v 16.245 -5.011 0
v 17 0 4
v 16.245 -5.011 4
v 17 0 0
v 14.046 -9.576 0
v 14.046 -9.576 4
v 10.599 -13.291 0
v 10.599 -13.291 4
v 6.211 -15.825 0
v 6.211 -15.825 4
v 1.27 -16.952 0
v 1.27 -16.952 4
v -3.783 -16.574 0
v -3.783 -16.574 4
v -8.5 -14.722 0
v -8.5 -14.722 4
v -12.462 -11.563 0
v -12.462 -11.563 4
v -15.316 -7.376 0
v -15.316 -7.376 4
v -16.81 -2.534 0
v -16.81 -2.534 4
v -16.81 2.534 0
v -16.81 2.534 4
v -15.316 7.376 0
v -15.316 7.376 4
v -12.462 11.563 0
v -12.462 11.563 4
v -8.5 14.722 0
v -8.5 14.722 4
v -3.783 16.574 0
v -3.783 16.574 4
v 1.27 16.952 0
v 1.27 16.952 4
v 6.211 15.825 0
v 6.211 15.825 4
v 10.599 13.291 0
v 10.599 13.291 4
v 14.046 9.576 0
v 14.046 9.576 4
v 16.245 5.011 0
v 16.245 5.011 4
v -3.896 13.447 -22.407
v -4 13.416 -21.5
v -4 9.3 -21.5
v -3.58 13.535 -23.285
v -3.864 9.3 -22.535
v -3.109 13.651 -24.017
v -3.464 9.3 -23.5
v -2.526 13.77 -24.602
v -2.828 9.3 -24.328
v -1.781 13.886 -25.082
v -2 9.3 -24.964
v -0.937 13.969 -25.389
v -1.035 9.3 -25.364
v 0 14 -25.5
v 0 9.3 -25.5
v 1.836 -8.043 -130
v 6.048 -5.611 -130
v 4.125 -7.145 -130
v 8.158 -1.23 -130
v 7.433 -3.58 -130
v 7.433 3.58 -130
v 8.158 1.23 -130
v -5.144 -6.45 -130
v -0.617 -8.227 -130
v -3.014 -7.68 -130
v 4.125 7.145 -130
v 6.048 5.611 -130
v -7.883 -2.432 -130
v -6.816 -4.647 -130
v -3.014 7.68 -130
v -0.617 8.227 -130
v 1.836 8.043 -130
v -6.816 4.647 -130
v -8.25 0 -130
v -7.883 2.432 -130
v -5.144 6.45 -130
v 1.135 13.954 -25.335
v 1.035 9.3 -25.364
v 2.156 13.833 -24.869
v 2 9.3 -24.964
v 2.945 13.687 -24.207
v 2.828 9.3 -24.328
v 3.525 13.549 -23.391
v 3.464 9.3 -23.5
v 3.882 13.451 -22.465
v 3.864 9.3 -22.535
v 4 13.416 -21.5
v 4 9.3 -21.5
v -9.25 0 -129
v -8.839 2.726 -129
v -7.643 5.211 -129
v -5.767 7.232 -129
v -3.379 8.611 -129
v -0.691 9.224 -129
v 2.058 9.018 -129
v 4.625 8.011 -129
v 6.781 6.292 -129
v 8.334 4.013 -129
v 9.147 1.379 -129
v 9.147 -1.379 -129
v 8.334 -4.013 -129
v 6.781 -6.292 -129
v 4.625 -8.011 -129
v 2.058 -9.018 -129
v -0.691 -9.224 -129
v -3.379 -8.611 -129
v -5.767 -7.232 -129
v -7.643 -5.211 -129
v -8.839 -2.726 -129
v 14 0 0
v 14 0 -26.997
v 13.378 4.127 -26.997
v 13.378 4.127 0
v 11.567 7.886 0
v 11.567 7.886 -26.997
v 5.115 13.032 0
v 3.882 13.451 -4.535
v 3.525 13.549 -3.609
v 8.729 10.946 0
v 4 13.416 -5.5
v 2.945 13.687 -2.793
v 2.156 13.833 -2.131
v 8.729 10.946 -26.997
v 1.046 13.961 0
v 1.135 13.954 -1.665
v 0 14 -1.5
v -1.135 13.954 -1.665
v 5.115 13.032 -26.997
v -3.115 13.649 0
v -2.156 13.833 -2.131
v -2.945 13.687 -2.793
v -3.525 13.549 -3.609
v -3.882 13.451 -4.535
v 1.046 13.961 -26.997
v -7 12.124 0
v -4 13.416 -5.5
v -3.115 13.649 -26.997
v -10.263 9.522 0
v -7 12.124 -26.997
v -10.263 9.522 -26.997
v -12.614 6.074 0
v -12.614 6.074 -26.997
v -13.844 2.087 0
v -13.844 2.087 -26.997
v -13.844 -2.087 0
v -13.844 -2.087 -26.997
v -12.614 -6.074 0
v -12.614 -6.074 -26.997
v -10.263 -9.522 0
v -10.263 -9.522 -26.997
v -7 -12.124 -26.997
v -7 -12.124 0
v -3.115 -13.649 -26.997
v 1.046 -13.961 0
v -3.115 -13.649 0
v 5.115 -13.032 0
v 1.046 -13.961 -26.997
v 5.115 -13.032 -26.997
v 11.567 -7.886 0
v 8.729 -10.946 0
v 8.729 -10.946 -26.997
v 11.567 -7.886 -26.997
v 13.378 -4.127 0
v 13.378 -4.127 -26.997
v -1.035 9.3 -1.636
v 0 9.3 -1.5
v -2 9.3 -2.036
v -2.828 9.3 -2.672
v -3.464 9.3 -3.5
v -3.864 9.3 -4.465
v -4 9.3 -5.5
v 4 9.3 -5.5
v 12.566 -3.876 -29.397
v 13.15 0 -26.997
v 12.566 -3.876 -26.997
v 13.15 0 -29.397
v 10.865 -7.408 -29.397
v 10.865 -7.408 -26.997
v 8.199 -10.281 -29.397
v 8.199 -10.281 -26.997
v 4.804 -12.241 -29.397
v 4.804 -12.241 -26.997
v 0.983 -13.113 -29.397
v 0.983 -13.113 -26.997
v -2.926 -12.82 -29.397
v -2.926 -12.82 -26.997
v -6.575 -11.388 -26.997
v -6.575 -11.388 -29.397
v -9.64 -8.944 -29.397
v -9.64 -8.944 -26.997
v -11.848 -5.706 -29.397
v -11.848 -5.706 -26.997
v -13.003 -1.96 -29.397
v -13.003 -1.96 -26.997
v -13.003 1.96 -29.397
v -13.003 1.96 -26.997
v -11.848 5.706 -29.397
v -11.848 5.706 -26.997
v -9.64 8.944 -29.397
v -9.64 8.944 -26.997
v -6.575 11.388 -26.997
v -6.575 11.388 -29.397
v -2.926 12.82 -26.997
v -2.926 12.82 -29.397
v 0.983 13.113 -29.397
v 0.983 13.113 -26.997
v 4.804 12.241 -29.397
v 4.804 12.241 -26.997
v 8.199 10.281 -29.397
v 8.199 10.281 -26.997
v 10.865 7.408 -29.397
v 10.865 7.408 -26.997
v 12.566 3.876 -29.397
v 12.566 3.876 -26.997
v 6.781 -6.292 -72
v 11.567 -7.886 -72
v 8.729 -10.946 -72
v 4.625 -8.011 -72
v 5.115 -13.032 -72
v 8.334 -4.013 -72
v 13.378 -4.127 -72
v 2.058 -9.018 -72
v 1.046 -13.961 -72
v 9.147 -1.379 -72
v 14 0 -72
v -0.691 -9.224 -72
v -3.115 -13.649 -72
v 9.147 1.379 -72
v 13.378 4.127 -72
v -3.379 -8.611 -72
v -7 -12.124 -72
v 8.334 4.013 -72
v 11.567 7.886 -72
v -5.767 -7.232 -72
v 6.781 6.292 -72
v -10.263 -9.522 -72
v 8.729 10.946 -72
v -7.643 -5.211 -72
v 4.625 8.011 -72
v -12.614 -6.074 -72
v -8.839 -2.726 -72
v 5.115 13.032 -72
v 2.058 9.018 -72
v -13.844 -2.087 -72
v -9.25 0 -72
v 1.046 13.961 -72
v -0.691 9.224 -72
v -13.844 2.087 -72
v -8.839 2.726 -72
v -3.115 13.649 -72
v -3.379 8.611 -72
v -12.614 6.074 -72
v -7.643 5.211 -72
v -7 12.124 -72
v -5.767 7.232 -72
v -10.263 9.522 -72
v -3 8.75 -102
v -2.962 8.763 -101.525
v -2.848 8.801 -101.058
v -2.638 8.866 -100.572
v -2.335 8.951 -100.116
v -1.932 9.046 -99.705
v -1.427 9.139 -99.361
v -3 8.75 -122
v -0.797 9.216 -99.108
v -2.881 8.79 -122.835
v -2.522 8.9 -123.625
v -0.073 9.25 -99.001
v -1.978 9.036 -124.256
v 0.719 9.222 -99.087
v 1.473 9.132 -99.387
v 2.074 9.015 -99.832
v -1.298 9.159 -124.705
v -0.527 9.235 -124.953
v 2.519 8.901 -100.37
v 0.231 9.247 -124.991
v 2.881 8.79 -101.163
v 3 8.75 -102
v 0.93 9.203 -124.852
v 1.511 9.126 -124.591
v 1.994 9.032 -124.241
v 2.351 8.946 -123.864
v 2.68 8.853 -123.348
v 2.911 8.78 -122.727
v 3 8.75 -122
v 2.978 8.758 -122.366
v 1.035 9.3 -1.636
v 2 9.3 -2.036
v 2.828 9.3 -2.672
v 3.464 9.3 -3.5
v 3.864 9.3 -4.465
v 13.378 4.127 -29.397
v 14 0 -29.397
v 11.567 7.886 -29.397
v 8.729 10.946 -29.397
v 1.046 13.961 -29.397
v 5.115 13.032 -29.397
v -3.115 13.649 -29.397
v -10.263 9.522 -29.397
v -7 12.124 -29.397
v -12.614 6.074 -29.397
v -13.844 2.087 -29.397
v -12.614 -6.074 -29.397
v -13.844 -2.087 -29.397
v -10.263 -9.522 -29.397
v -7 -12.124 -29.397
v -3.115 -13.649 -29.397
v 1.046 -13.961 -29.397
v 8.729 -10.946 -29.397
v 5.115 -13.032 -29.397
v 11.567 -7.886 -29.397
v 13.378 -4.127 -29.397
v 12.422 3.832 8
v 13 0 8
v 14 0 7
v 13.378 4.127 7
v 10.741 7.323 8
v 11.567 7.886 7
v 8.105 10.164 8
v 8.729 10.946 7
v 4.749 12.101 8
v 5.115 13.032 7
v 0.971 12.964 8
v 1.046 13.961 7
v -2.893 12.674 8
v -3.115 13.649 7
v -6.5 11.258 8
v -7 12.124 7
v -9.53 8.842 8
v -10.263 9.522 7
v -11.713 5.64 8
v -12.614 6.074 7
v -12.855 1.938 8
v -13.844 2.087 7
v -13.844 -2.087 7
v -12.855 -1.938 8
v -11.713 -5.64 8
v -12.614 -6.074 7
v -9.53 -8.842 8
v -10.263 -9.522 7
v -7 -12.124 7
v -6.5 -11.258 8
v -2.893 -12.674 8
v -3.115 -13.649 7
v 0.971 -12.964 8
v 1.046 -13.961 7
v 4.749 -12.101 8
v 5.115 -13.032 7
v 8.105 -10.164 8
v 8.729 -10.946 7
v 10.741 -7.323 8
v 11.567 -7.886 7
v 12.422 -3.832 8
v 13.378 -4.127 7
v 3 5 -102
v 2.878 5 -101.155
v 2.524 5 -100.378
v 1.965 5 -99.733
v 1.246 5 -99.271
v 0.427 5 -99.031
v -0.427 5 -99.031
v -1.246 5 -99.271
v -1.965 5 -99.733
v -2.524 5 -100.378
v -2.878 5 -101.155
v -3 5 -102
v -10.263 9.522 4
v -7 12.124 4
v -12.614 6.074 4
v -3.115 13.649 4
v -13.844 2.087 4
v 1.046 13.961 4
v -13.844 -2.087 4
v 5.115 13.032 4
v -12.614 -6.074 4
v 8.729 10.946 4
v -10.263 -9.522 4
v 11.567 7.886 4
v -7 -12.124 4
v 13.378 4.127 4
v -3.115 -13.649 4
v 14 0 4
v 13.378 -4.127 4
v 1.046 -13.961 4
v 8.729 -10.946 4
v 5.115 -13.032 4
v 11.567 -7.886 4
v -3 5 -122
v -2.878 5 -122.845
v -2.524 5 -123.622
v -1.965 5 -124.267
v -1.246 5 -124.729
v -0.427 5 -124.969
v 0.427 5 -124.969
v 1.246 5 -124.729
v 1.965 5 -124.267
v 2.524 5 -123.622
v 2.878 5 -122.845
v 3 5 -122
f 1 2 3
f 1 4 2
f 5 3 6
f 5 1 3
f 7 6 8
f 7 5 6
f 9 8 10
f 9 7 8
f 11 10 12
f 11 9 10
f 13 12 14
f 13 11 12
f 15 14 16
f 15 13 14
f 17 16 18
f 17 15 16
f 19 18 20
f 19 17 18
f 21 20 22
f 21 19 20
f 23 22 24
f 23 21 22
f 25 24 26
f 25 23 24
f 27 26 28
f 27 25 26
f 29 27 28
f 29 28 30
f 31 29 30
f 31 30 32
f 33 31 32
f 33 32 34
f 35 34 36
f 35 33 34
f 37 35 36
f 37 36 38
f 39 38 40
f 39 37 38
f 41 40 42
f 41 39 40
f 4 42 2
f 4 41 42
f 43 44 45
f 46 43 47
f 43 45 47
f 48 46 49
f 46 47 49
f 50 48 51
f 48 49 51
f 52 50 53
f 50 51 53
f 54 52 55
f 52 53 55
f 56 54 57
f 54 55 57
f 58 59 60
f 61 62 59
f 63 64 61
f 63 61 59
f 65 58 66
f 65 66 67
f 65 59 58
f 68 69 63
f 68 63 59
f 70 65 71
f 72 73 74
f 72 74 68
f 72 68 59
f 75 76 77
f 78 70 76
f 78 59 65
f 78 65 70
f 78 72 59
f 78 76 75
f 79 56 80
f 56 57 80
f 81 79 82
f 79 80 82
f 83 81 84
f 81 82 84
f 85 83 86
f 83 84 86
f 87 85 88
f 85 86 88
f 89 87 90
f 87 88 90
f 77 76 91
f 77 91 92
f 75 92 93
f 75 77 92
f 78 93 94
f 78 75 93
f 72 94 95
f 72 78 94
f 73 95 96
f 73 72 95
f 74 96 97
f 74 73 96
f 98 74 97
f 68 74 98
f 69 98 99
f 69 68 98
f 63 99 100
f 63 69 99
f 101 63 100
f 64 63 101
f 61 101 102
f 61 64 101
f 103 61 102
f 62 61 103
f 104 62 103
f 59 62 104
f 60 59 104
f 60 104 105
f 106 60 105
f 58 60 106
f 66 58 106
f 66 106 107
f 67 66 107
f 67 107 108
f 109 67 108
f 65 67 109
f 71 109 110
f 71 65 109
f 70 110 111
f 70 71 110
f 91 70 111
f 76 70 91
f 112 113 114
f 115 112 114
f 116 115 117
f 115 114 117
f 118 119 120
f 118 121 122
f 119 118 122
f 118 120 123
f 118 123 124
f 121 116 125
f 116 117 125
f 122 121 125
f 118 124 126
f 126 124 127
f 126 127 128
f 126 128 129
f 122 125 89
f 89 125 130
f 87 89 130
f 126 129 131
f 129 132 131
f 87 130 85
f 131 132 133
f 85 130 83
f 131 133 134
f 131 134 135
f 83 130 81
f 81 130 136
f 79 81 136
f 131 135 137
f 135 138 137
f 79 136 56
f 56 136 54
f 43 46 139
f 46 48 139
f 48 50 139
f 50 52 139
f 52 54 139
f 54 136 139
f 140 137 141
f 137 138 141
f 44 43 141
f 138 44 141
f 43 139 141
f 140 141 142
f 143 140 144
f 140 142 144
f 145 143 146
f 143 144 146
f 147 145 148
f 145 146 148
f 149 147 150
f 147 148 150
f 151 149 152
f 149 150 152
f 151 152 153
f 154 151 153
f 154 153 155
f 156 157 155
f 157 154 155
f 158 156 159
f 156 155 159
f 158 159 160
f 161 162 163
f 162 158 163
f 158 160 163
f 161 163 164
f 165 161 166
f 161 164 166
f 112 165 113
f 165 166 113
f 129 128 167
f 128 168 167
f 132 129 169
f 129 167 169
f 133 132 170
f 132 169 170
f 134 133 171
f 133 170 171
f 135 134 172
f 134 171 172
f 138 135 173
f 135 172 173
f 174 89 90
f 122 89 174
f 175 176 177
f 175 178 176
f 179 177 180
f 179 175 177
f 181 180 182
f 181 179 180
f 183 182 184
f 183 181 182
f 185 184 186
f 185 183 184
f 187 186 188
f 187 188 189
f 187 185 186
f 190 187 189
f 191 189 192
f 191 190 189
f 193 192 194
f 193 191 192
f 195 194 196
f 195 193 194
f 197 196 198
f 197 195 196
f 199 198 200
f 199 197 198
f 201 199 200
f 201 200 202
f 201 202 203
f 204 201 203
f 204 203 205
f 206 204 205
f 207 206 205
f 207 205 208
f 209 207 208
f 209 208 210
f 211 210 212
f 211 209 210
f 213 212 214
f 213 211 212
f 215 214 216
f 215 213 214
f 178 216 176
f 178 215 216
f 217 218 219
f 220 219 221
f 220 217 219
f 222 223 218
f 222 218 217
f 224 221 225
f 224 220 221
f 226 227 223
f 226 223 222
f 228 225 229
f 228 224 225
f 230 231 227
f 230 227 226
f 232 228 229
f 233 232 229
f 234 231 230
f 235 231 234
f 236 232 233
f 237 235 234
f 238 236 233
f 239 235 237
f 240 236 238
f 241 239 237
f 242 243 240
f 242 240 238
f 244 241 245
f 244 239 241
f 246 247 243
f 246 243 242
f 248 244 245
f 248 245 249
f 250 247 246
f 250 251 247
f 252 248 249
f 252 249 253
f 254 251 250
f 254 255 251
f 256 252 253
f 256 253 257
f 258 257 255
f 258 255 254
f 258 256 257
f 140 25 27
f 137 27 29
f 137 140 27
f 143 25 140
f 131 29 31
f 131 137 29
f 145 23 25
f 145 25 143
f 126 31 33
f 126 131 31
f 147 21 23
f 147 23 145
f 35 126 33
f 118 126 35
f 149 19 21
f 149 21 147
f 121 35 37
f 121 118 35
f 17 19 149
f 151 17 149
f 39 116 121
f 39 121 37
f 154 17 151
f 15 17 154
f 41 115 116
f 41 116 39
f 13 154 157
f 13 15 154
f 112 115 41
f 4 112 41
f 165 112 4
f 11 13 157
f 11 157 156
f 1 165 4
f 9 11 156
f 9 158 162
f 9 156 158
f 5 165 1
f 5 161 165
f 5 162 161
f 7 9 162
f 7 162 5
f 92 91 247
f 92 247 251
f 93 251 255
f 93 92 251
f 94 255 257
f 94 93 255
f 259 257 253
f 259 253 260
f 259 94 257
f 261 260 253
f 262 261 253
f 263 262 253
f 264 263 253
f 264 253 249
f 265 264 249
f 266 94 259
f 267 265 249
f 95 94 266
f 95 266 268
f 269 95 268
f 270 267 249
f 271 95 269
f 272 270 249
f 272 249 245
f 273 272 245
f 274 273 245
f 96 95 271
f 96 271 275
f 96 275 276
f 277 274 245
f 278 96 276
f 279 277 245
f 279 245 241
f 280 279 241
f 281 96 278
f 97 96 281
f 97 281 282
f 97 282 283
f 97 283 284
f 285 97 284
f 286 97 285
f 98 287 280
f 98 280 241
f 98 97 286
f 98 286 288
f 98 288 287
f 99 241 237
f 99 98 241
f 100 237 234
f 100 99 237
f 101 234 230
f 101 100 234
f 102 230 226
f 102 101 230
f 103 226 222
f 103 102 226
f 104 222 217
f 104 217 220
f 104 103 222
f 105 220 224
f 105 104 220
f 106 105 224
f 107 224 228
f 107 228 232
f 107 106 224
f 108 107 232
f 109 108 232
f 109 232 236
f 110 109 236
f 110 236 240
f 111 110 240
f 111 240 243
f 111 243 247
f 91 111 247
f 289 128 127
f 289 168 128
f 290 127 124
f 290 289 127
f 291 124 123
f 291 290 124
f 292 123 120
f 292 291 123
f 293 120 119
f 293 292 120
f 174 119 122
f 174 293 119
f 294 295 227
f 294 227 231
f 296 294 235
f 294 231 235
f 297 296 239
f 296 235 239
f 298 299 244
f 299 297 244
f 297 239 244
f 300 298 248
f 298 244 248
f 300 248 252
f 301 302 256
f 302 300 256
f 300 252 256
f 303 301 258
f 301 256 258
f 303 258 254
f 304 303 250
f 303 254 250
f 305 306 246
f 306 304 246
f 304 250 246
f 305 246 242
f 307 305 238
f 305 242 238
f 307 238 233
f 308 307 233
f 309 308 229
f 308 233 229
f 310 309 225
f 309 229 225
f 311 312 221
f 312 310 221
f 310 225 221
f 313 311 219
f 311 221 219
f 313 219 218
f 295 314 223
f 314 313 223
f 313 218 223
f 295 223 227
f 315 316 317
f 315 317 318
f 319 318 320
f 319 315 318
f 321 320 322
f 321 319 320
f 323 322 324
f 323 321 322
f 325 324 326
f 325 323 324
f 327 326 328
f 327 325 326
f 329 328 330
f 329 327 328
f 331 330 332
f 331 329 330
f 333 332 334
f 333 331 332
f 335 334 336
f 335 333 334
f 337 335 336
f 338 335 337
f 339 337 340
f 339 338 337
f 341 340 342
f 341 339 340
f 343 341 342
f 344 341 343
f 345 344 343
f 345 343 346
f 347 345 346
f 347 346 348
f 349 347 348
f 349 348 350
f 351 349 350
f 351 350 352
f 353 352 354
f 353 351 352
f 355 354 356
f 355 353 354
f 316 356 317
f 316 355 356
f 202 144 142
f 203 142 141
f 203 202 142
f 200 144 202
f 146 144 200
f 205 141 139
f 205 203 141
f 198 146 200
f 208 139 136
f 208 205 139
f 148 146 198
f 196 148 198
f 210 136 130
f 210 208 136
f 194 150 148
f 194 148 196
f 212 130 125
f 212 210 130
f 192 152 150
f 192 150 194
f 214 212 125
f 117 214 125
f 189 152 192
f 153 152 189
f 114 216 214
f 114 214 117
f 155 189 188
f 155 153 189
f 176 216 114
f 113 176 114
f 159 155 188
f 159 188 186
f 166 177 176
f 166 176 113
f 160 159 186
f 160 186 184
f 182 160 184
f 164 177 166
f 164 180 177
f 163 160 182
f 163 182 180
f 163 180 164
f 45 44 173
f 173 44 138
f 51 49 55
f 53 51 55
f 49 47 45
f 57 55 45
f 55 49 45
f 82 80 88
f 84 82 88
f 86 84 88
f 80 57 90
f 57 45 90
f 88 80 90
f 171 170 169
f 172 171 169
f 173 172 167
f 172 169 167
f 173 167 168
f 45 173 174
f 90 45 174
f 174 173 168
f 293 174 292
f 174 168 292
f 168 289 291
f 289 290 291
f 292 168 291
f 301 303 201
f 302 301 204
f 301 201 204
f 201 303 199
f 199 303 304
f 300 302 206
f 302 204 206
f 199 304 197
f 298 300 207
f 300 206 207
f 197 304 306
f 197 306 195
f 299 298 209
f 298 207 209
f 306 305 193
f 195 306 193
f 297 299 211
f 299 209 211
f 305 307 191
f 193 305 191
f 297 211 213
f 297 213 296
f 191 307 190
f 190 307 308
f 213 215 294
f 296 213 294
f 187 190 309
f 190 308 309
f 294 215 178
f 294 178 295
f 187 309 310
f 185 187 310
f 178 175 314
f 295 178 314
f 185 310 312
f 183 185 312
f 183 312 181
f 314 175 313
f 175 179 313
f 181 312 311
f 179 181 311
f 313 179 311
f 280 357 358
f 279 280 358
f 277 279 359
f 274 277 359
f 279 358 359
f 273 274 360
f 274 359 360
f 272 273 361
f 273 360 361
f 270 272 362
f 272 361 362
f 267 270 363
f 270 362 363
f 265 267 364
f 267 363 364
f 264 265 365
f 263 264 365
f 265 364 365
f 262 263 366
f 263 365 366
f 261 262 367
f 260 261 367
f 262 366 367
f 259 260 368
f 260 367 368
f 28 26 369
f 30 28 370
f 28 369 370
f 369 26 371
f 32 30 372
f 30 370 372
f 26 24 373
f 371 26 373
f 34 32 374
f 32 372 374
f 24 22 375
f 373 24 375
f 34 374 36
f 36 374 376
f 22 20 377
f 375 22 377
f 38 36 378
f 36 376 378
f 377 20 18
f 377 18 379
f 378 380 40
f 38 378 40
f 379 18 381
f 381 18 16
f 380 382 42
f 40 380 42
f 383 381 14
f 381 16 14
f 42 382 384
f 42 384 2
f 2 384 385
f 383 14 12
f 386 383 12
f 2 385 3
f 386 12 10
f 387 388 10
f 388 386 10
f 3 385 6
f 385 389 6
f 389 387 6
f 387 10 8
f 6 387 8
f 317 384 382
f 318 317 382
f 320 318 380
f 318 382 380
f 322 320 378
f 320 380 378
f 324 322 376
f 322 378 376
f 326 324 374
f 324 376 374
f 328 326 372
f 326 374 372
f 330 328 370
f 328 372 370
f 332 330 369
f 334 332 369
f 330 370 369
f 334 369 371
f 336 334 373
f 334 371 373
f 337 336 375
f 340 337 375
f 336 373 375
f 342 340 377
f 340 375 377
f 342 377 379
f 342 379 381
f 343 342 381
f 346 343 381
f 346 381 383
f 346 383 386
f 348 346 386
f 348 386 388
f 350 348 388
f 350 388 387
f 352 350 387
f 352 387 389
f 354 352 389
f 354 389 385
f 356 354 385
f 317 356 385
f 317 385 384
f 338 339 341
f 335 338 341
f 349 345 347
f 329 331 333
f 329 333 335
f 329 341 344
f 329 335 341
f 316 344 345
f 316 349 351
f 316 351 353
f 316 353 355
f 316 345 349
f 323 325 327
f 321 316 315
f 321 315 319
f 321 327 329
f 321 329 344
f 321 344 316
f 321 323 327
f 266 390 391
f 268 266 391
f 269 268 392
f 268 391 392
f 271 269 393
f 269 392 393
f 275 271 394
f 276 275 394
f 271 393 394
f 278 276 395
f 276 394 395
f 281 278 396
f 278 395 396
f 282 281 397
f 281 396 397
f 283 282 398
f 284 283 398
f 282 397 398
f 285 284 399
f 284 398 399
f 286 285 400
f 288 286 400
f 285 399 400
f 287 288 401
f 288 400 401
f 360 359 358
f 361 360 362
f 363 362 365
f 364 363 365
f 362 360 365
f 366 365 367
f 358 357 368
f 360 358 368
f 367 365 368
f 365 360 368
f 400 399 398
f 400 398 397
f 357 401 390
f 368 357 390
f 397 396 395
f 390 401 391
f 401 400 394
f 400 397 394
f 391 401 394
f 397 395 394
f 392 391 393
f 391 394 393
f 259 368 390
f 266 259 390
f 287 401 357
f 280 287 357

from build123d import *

# Parameters (mm, degrees)
BOSS_EXTRUDE1_DEPTH      = 5
BOSS_EXTRUDE1_DEPTH_BACK = 100
SKETCH1_R                = 14
SKETCH2_W                = 8
SKETCH2_H                = 24
CUT_EXTRUDE1_DEPTH       = 8
SKETCH3_R                = 14
BOSS_EXTRUDE2_DEPTH      = 8
FILLET1_R                = 4
SKETCH4_W                = 4
SKETCH4_H                = 3
SKETCH7_W                = 6.85
SKETCH7_H                = 2.4
CUT_EXTRUDE2_START       = -5
SKETCH8_R                = 14
CUT_EXTRUDE2_DEPTH       = 5
SKETCH9_R                = 21.936925755
SKETCH9_R_2              = 9.25
CUT_EXTRUDE3_DEPTH       = 28
BOSS_EXTRUDE3_START      = 30
SKETCH10_R               = 9.25
BOSS_EXTRUDE3_DEPTH      = 30
CHAMFER1_SIZE            = 1
CUT_EXTRUDE4_START       = 5
CUT_EXTRUDE4_DEPTH       = 10


with BuildPart() as part:
    # Sketch1 → Boss-Extrude1 (new, two sides: drawn at the far end of the back side and taken through both)
    with BuildSketch(Plane.XY.offset(-BOSS_EXTRUDE1_DEPTH_BACK)):
        Circle(SKETCH1_R)
    extrude(amount=BOSS_EXTRUDE1_DEPTH + BOSS_EXTRUDE1_DEPTH_BACK)

    # Sketch2 → Cut-Extrude1 (cut)
    with BuildSketch(Plane.XZ.offset(-17.3)):
        with Locations((0, -13.5)):
            Rectangle(SKETCH2_W, SKETCH2_H)
    extrude(amount=CUT_EXTRUDE1_DEPTH, mode=Mode.SUBTRACT)

    # Sketch3 → Boss-Extrude2 (add)
    with BuildSketch(Plane.XY.offset(5)):
        Circle(SKETCH3_R)
    extrude(amount=BOSS_EXTRUDE2_DEPTH)

    # Fillet1
    fillet1_edges = [part.edges().sort_by_distance(p)[0] for p in [
        (-4, 11.358203932, -25.5),
        (4, 11.358203932, -25.5),
        (4, 11.358203932, -1.5),
        (-4, 11.358203932, -1.5),
    ]]
    fillet(fillet1_edges, radius=FILLET1_R - 0.0001)  # a hair under: the kernel refuses the full size

    # Sketch4 → Revolve1 (revolve)
    with BuildSketch(Plane(origin=(0, 0, 0), x_dir=(0, 0, -1), z_dir=(1, 0, 0)), mode=Mode.PRIVATE) as revolve1_sk:
        with Locations((-2, -15.5)):
            Rectangle(SKETCH4_W, SKETCH4_H)
    revolve(revolve1_sk.sketch.rotate(Axis((0, 0, 0), (0, 0, -1)), 270), axis=Axis((0, 0, 0), (0, 0, -1)))

    # Sketch7 → Cut-Revolve2 (revolve, cut)
    with BuildSketch(Plane(origin=(0, 0, 0), x_dir=(1, 0, 0), z_dir=(0, 1, 0)), mode=Mode.PRIVATE) as cut_revolve2_sk:
        with Locations((-16.575, 28.197290459)):
            Rectangle(SKETCH7_W, SKETCH7_H)
    revolve(cut_revolve2_sk.sketch.rotate(Axis((0, 0, 5), (0, 0, -1)), 180), axis=Axis((0, 0, 5), (0, 0, -1)), mode=Mode.SUBTRACT)

    # Sketch8 → Cut-Extrude2 (cut)
    with BuildSketch(Plane.XY.offset(13).offset(CUT_EXTRUDE2_START)):
        Circle(SKETCH8_R)
    extrude(amount=CUT_EXTRUDE2_DEPTH, mode=Mode.SUBTRACT)

    # Sketch9 → Cut-Extrude3 (cut)
    with BuildSketch(Plane(origin=(0, 0, -100), x_dir=(-1, 0, 0), z_dir=(0, 0, -1))):
        Circle(SKETCH9_R)
        Circle(SKETCH9_R_2, mode=Mode.SUBTRACT)
    extrude(amount=-CUT_EXTRUDE3_DEPTH, mode=Mode.SUBTRACT)

    # Sketch10 → Boss-Extrude3 (add)
    with BuildSketch(Plane(origin=(0, 0, -100), x_dir=(-1, 0, 0), z_dir=(0, 0, -1)).offset(BOSS_EXTRUDE3_START)):
        Circle(SKETCH10_R)
    extrude(amount=-BOSS_EXTRUDE3_DEPTH)

    # Chamfer1
    chamfer1_edges = [part.edges().sort_by_distance(p)[0] for p in [
        (9.25, 0, -130),
        (-14, 0, 8),
    ]]
    chamfer(chamfer1_edges, length=CHAMFER1_SIZE)

    # Sketch15 → Cut-Extrude4 (cut)
    with BuildSketch(Plane(origin=(0, 0, 0), x_dir=(1, 0, 0), z_dir=(0, 1, 0)).offset(CUT_EXTRUDE4_START)):
        with BuildLine():
            Line((3, 122), (3, 102))
            ThreePointArc((3, 102), (0, 99), (-3, 102))
            Line((-3, 102), (-3, 122))
            ThreePointArc((-3, 122), (0, 125), (3, 122))
        make_face()
    extrude(amount=CUT_EXTRUDE4_DEPTH, mode=Mode.SUBTRACT)


solid = part.part
